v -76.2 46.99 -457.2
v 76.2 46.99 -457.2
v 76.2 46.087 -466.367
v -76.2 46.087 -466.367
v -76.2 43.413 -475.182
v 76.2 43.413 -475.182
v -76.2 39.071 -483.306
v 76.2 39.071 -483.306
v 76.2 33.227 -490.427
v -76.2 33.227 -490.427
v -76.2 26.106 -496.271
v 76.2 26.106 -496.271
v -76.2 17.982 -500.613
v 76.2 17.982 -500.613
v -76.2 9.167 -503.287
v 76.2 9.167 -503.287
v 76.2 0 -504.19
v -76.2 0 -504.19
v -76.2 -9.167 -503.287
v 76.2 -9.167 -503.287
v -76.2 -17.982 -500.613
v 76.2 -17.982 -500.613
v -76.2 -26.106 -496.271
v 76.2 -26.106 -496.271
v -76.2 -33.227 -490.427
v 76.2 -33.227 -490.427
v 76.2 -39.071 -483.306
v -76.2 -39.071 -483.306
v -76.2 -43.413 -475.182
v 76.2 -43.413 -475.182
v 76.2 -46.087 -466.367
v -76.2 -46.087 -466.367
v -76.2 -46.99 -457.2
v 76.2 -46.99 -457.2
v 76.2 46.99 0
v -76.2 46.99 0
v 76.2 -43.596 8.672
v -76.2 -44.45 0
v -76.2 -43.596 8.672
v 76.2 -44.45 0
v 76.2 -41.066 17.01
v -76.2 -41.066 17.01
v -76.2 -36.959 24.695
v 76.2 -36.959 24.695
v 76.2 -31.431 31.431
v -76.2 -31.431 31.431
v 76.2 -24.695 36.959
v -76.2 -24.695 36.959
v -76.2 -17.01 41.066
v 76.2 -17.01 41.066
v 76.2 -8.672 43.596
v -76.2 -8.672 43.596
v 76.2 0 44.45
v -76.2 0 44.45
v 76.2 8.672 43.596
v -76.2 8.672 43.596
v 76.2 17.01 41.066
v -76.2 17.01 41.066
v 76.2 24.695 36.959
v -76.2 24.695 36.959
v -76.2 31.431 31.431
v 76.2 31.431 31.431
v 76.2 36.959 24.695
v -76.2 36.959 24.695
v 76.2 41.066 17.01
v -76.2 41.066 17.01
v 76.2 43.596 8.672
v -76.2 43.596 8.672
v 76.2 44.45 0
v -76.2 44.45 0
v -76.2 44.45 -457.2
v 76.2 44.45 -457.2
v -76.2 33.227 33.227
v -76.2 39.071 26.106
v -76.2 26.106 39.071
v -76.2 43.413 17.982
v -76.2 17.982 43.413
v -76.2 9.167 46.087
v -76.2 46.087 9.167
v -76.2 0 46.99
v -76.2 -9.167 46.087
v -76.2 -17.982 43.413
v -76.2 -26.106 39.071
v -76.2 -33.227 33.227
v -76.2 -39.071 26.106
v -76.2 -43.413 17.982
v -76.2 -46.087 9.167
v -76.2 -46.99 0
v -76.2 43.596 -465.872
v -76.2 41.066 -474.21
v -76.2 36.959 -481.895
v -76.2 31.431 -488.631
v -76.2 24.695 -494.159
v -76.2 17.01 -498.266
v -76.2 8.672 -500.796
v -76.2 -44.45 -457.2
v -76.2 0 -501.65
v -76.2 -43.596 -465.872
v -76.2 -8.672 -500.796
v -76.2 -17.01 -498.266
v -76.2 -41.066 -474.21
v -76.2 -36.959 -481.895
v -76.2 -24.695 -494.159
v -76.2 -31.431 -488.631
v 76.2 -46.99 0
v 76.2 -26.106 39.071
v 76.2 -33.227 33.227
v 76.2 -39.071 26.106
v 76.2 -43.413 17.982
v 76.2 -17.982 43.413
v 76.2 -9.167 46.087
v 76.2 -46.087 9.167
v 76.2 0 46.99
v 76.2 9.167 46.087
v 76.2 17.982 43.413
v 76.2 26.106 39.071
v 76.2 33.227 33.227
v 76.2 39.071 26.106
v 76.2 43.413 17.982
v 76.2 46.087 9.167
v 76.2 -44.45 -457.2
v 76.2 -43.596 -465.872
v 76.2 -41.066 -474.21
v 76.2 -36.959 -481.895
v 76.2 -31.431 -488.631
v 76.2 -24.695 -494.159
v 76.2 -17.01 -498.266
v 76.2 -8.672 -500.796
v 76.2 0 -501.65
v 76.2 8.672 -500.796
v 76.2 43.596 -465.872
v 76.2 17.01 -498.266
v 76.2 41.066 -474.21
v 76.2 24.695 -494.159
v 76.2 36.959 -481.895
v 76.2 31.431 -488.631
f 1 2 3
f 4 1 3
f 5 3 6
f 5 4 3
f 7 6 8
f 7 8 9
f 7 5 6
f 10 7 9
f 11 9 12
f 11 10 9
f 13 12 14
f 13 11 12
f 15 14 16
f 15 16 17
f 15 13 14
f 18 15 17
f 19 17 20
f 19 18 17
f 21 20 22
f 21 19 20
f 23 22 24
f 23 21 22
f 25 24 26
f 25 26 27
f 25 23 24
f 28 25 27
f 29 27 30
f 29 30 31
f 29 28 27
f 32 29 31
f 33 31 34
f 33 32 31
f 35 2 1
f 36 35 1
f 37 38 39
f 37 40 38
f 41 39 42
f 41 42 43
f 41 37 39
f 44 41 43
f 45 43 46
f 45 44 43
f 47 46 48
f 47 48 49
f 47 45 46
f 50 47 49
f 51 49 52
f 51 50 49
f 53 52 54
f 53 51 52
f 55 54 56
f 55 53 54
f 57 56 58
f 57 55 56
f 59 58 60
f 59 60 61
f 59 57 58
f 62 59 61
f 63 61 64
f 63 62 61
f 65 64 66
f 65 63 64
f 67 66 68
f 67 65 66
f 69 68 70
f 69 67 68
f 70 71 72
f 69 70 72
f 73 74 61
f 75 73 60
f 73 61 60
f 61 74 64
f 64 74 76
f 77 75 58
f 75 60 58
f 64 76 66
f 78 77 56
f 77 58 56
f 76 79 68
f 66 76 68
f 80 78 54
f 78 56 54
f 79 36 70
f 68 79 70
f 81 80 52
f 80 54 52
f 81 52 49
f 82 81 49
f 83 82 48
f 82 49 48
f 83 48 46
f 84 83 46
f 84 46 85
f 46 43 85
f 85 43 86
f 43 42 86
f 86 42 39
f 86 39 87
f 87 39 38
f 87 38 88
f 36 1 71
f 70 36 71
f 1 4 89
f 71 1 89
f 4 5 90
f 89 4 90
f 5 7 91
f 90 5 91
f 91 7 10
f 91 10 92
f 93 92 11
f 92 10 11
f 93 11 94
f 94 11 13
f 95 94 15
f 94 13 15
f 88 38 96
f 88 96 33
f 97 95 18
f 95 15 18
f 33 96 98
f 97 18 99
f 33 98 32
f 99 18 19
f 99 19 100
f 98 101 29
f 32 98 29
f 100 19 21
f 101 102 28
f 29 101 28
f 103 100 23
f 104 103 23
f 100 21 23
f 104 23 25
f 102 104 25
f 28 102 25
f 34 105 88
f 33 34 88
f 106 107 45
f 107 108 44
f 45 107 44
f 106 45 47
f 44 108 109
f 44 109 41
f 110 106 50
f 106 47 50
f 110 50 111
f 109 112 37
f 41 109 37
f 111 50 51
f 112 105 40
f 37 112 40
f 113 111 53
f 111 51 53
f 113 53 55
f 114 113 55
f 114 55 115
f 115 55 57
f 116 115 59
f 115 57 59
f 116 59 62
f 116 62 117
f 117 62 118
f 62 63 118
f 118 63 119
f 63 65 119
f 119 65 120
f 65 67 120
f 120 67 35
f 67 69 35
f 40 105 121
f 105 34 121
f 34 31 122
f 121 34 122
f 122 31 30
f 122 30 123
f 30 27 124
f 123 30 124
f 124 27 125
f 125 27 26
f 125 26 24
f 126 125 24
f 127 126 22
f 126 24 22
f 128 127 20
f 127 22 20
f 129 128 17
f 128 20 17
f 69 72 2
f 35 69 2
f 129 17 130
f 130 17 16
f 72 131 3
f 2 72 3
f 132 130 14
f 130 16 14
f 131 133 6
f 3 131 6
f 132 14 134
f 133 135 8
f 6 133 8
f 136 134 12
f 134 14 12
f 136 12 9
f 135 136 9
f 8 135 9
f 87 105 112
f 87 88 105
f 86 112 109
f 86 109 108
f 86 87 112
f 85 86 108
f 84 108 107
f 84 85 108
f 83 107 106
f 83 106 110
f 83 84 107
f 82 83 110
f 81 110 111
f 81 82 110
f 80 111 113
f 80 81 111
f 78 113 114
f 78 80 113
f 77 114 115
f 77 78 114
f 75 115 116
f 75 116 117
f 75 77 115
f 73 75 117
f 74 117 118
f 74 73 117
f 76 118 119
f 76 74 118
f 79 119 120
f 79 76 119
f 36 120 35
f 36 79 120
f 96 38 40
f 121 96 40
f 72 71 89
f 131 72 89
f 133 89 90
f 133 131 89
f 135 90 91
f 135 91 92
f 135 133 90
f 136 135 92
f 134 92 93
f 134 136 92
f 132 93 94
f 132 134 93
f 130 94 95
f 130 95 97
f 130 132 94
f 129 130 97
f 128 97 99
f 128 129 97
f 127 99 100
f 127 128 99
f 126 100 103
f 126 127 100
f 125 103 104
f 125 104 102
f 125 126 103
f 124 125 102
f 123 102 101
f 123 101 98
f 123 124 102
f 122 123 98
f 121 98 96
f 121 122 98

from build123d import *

# Parameters (mm, degrees)
SKETCH1_W = 152.4
SKETCH1_H = 2.54


with BuildPart() as part:
    # Sweep1: sweep along a path in Sketch2
    with BuildLine(Plane(origin=(0, 0, 0), x_dir=(0, 0, -1), z_dir=(1, 0, 0))) as sweep1_path:
        Line((0, 45.72), (457.2, 45.72))
        ThreePointArc((457.2, 45.72), (502.92, 0), (457.2, -45.72))
        Line((457.2, -45.72), (0, -45.72))
        ThreePointArc((0, -45.72), (-45.72, 0), (0, 45.72))
    # Sketch1 → Sweep1 (sweep)
    with BuildSketch(Plane.XY):
        with Locations((0, 45.72)):
            Rectangle(SKETCH1_W, SKETCH1_H)
    sweep(path=sweep1_path.line)


solid = part.part
